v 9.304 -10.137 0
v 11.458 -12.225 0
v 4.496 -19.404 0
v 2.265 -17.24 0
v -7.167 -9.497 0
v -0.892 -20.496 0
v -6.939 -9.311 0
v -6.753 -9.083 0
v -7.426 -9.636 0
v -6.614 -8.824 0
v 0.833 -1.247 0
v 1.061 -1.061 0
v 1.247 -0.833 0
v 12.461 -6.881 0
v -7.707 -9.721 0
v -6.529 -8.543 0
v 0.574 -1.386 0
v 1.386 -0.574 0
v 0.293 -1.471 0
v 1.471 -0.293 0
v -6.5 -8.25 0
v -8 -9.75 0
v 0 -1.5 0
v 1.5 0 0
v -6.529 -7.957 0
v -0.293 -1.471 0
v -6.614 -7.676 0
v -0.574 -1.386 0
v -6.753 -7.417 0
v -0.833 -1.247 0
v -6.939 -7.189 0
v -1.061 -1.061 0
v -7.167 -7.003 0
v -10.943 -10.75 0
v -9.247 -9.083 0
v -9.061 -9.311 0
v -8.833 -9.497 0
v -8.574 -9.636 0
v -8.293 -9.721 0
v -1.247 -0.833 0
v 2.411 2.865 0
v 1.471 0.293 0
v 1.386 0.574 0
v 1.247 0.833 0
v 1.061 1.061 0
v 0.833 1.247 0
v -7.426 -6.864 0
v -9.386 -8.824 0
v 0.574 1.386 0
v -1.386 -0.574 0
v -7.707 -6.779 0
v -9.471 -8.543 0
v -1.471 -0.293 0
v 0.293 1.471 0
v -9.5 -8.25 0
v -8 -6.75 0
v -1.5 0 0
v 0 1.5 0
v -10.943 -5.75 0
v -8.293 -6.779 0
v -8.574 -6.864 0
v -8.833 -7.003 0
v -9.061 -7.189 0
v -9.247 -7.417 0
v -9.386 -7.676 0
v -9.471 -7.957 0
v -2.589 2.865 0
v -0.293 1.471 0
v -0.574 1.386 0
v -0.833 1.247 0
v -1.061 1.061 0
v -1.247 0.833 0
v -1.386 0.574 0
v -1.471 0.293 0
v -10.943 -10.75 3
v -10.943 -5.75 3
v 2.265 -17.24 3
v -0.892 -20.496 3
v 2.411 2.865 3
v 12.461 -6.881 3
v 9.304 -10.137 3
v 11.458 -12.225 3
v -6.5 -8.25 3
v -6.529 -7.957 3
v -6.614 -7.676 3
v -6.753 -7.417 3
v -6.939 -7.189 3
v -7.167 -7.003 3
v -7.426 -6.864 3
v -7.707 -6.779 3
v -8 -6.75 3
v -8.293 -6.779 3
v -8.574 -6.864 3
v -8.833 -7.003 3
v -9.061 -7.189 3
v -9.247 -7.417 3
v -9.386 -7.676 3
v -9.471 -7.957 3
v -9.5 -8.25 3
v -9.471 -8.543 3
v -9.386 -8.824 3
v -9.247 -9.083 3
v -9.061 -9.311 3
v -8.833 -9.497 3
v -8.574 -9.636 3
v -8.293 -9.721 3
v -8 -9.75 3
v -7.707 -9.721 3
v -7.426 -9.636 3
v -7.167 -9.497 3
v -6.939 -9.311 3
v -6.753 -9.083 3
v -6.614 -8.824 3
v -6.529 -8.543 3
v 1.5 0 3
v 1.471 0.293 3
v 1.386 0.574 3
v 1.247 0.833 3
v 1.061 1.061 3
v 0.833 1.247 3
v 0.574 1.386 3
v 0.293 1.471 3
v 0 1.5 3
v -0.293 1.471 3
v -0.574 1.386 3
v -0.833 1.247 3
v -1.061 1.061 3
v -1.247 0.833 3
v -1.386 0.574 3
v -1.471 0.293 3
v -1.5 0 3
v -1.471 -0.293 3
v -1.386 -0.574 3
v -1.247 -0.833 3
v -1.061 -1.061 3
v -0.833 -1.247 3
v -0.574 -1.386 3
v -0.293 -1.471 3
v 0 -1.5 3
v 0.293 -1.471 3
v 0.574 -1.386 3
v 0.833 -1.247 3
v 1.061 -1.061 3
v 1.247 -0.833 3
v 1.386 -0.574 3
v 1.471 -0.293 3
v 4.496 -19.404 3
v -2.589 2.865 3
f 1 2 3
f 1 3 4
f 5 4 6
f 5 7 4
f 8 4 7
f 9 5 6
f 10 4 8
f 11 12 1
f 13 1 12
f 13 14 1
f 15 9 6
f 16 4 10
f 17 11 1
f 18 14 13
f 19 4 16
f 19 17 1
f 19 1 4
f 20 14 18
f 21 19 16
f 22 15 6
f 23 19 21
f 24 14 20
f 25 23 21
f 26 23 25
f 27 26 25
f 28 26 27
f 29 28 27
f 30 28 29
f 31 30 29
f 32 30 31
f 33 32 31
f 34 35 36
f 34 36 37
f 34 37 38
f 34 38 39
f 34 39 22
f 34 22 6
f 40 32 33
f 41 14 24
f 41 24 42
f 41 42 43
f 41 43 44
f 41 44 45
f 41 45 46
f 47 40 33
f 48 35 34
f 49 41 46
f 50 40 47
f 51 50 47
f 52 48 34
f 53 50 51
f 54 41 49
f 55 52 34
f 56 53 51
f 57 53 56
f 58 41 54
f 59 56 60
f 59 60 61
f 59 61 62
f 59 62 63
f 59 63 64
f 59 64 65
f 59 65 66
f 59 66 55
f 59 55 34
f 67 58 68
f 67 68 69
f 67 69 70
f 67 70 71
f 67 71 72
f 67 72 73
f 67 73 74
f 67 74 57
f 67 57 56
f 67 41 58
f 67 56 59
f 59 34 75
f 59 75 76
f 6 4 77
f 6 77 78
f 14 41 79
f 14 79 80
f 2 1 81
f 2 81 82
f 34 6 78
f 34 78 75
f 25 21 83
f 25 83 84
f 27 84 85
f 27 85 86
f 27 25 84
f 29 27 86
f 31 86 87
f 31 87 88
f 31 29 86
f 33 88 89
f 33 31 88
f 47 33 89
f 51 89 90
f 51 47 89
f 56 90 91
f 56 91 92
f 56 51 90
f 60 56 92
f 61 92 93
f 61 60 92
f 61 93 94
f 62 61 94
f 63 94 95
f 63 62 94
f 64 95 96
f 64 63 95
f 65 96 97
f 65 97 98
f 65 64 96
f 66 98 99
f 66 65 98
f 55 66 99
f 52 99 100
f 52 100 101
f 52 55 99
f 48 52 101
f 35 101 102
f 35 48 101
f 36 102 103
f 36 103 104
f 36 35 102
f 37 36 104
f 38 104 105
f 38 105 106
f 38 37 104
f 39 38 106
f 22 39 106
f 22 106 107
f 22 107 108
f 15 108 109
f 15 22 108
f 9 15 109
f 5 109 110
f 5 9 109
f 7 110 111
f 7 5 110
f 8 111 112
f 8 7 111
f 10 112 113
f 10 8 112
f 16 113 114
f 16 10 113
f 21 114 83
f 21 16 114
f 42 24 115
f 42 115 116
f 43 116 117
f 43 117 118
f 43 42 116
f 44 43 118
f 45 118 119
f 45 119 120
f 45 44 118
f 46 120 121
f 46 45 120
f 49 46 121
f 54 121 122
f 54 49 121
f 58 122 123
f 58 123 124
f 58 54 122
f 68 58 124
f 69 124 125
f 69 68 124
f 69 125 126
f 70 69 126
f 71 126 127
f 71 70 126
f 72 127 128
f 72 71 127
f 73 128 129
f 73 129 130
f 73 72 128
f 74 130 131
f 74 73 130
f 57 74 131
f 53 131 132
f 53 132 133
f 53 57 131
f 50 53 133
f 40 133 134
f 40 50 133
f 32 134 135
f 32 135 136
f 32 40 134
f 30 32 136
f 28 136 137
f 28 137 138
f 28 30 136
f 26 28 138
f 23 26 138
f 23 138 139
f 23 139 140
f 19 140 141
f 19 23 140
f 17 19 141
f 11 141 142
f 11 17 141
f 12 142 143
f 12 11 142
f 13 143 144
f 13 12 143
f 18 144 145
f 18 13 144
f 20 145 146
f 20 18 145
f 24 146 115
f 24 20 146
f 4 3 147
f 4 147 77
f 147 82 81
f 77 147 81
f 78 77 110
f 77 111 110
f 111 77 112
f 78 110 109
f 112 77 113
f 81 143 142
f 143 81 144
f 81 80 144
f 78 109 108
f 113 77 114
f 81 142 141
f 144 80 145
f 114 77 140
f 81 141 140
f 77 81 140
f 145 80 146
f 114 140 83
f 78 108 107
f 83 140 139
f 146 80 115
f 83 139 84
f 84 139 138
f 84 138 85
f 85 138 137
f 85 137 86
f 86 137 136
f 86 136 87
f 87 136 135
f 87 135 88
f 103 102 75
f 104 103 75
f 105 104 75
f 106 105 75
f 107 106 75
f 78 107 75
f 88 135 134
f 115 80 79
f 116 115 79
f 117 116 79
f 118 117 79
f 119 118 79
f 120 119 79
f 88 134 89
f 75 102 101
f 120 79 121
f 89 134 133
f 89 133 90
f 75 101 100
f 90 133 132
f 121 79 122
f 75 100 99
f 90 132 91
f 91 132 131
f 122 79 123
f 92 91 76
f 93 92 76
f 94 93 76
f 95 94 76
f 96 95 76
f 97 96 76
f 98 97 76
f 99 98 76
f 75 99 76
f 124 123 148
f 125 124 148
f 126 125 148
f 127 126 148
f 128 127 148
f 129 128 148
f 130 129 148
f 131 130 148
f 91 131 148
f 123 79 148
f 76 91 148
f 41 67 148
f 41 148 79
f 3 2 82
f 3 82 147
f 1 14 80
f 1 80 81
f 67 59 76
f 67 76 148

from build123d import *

# Parameters (mm, degrees)
ESQUISSE1_R        = 1.5
BOSS_EXTRU_2_DEPTH = 3


with BuildPart() as part:
    # Esquisse1 → Boss.-Extru.2 (new body)
    with BuildSketch(Plane.XY):
        Polygon((-10.943102451, -5.75), (-2.589352418, 2.864804721), (2.410647582, 2.864804721), (12.46125309, -6.881236984), (9.304151267, -10.136998238), (11.457852448, -12.225435747), (4.496394087, -19.404439681), (2.26460488, -17.24028045), (-0.892496943, -20.496041705), (-10.943102451, -10.75), align=None)
        Circle(ESQUISSE1_R, mode=Mode.SUBTRACT)
        with Locations((-8, -8.25)):
            Circle(ESQUISSE1_R, mode=Mode.SUBTRACT)
    extrude(amount=BOSS_EXTRU_2_DEPTH)


solid = part.part
